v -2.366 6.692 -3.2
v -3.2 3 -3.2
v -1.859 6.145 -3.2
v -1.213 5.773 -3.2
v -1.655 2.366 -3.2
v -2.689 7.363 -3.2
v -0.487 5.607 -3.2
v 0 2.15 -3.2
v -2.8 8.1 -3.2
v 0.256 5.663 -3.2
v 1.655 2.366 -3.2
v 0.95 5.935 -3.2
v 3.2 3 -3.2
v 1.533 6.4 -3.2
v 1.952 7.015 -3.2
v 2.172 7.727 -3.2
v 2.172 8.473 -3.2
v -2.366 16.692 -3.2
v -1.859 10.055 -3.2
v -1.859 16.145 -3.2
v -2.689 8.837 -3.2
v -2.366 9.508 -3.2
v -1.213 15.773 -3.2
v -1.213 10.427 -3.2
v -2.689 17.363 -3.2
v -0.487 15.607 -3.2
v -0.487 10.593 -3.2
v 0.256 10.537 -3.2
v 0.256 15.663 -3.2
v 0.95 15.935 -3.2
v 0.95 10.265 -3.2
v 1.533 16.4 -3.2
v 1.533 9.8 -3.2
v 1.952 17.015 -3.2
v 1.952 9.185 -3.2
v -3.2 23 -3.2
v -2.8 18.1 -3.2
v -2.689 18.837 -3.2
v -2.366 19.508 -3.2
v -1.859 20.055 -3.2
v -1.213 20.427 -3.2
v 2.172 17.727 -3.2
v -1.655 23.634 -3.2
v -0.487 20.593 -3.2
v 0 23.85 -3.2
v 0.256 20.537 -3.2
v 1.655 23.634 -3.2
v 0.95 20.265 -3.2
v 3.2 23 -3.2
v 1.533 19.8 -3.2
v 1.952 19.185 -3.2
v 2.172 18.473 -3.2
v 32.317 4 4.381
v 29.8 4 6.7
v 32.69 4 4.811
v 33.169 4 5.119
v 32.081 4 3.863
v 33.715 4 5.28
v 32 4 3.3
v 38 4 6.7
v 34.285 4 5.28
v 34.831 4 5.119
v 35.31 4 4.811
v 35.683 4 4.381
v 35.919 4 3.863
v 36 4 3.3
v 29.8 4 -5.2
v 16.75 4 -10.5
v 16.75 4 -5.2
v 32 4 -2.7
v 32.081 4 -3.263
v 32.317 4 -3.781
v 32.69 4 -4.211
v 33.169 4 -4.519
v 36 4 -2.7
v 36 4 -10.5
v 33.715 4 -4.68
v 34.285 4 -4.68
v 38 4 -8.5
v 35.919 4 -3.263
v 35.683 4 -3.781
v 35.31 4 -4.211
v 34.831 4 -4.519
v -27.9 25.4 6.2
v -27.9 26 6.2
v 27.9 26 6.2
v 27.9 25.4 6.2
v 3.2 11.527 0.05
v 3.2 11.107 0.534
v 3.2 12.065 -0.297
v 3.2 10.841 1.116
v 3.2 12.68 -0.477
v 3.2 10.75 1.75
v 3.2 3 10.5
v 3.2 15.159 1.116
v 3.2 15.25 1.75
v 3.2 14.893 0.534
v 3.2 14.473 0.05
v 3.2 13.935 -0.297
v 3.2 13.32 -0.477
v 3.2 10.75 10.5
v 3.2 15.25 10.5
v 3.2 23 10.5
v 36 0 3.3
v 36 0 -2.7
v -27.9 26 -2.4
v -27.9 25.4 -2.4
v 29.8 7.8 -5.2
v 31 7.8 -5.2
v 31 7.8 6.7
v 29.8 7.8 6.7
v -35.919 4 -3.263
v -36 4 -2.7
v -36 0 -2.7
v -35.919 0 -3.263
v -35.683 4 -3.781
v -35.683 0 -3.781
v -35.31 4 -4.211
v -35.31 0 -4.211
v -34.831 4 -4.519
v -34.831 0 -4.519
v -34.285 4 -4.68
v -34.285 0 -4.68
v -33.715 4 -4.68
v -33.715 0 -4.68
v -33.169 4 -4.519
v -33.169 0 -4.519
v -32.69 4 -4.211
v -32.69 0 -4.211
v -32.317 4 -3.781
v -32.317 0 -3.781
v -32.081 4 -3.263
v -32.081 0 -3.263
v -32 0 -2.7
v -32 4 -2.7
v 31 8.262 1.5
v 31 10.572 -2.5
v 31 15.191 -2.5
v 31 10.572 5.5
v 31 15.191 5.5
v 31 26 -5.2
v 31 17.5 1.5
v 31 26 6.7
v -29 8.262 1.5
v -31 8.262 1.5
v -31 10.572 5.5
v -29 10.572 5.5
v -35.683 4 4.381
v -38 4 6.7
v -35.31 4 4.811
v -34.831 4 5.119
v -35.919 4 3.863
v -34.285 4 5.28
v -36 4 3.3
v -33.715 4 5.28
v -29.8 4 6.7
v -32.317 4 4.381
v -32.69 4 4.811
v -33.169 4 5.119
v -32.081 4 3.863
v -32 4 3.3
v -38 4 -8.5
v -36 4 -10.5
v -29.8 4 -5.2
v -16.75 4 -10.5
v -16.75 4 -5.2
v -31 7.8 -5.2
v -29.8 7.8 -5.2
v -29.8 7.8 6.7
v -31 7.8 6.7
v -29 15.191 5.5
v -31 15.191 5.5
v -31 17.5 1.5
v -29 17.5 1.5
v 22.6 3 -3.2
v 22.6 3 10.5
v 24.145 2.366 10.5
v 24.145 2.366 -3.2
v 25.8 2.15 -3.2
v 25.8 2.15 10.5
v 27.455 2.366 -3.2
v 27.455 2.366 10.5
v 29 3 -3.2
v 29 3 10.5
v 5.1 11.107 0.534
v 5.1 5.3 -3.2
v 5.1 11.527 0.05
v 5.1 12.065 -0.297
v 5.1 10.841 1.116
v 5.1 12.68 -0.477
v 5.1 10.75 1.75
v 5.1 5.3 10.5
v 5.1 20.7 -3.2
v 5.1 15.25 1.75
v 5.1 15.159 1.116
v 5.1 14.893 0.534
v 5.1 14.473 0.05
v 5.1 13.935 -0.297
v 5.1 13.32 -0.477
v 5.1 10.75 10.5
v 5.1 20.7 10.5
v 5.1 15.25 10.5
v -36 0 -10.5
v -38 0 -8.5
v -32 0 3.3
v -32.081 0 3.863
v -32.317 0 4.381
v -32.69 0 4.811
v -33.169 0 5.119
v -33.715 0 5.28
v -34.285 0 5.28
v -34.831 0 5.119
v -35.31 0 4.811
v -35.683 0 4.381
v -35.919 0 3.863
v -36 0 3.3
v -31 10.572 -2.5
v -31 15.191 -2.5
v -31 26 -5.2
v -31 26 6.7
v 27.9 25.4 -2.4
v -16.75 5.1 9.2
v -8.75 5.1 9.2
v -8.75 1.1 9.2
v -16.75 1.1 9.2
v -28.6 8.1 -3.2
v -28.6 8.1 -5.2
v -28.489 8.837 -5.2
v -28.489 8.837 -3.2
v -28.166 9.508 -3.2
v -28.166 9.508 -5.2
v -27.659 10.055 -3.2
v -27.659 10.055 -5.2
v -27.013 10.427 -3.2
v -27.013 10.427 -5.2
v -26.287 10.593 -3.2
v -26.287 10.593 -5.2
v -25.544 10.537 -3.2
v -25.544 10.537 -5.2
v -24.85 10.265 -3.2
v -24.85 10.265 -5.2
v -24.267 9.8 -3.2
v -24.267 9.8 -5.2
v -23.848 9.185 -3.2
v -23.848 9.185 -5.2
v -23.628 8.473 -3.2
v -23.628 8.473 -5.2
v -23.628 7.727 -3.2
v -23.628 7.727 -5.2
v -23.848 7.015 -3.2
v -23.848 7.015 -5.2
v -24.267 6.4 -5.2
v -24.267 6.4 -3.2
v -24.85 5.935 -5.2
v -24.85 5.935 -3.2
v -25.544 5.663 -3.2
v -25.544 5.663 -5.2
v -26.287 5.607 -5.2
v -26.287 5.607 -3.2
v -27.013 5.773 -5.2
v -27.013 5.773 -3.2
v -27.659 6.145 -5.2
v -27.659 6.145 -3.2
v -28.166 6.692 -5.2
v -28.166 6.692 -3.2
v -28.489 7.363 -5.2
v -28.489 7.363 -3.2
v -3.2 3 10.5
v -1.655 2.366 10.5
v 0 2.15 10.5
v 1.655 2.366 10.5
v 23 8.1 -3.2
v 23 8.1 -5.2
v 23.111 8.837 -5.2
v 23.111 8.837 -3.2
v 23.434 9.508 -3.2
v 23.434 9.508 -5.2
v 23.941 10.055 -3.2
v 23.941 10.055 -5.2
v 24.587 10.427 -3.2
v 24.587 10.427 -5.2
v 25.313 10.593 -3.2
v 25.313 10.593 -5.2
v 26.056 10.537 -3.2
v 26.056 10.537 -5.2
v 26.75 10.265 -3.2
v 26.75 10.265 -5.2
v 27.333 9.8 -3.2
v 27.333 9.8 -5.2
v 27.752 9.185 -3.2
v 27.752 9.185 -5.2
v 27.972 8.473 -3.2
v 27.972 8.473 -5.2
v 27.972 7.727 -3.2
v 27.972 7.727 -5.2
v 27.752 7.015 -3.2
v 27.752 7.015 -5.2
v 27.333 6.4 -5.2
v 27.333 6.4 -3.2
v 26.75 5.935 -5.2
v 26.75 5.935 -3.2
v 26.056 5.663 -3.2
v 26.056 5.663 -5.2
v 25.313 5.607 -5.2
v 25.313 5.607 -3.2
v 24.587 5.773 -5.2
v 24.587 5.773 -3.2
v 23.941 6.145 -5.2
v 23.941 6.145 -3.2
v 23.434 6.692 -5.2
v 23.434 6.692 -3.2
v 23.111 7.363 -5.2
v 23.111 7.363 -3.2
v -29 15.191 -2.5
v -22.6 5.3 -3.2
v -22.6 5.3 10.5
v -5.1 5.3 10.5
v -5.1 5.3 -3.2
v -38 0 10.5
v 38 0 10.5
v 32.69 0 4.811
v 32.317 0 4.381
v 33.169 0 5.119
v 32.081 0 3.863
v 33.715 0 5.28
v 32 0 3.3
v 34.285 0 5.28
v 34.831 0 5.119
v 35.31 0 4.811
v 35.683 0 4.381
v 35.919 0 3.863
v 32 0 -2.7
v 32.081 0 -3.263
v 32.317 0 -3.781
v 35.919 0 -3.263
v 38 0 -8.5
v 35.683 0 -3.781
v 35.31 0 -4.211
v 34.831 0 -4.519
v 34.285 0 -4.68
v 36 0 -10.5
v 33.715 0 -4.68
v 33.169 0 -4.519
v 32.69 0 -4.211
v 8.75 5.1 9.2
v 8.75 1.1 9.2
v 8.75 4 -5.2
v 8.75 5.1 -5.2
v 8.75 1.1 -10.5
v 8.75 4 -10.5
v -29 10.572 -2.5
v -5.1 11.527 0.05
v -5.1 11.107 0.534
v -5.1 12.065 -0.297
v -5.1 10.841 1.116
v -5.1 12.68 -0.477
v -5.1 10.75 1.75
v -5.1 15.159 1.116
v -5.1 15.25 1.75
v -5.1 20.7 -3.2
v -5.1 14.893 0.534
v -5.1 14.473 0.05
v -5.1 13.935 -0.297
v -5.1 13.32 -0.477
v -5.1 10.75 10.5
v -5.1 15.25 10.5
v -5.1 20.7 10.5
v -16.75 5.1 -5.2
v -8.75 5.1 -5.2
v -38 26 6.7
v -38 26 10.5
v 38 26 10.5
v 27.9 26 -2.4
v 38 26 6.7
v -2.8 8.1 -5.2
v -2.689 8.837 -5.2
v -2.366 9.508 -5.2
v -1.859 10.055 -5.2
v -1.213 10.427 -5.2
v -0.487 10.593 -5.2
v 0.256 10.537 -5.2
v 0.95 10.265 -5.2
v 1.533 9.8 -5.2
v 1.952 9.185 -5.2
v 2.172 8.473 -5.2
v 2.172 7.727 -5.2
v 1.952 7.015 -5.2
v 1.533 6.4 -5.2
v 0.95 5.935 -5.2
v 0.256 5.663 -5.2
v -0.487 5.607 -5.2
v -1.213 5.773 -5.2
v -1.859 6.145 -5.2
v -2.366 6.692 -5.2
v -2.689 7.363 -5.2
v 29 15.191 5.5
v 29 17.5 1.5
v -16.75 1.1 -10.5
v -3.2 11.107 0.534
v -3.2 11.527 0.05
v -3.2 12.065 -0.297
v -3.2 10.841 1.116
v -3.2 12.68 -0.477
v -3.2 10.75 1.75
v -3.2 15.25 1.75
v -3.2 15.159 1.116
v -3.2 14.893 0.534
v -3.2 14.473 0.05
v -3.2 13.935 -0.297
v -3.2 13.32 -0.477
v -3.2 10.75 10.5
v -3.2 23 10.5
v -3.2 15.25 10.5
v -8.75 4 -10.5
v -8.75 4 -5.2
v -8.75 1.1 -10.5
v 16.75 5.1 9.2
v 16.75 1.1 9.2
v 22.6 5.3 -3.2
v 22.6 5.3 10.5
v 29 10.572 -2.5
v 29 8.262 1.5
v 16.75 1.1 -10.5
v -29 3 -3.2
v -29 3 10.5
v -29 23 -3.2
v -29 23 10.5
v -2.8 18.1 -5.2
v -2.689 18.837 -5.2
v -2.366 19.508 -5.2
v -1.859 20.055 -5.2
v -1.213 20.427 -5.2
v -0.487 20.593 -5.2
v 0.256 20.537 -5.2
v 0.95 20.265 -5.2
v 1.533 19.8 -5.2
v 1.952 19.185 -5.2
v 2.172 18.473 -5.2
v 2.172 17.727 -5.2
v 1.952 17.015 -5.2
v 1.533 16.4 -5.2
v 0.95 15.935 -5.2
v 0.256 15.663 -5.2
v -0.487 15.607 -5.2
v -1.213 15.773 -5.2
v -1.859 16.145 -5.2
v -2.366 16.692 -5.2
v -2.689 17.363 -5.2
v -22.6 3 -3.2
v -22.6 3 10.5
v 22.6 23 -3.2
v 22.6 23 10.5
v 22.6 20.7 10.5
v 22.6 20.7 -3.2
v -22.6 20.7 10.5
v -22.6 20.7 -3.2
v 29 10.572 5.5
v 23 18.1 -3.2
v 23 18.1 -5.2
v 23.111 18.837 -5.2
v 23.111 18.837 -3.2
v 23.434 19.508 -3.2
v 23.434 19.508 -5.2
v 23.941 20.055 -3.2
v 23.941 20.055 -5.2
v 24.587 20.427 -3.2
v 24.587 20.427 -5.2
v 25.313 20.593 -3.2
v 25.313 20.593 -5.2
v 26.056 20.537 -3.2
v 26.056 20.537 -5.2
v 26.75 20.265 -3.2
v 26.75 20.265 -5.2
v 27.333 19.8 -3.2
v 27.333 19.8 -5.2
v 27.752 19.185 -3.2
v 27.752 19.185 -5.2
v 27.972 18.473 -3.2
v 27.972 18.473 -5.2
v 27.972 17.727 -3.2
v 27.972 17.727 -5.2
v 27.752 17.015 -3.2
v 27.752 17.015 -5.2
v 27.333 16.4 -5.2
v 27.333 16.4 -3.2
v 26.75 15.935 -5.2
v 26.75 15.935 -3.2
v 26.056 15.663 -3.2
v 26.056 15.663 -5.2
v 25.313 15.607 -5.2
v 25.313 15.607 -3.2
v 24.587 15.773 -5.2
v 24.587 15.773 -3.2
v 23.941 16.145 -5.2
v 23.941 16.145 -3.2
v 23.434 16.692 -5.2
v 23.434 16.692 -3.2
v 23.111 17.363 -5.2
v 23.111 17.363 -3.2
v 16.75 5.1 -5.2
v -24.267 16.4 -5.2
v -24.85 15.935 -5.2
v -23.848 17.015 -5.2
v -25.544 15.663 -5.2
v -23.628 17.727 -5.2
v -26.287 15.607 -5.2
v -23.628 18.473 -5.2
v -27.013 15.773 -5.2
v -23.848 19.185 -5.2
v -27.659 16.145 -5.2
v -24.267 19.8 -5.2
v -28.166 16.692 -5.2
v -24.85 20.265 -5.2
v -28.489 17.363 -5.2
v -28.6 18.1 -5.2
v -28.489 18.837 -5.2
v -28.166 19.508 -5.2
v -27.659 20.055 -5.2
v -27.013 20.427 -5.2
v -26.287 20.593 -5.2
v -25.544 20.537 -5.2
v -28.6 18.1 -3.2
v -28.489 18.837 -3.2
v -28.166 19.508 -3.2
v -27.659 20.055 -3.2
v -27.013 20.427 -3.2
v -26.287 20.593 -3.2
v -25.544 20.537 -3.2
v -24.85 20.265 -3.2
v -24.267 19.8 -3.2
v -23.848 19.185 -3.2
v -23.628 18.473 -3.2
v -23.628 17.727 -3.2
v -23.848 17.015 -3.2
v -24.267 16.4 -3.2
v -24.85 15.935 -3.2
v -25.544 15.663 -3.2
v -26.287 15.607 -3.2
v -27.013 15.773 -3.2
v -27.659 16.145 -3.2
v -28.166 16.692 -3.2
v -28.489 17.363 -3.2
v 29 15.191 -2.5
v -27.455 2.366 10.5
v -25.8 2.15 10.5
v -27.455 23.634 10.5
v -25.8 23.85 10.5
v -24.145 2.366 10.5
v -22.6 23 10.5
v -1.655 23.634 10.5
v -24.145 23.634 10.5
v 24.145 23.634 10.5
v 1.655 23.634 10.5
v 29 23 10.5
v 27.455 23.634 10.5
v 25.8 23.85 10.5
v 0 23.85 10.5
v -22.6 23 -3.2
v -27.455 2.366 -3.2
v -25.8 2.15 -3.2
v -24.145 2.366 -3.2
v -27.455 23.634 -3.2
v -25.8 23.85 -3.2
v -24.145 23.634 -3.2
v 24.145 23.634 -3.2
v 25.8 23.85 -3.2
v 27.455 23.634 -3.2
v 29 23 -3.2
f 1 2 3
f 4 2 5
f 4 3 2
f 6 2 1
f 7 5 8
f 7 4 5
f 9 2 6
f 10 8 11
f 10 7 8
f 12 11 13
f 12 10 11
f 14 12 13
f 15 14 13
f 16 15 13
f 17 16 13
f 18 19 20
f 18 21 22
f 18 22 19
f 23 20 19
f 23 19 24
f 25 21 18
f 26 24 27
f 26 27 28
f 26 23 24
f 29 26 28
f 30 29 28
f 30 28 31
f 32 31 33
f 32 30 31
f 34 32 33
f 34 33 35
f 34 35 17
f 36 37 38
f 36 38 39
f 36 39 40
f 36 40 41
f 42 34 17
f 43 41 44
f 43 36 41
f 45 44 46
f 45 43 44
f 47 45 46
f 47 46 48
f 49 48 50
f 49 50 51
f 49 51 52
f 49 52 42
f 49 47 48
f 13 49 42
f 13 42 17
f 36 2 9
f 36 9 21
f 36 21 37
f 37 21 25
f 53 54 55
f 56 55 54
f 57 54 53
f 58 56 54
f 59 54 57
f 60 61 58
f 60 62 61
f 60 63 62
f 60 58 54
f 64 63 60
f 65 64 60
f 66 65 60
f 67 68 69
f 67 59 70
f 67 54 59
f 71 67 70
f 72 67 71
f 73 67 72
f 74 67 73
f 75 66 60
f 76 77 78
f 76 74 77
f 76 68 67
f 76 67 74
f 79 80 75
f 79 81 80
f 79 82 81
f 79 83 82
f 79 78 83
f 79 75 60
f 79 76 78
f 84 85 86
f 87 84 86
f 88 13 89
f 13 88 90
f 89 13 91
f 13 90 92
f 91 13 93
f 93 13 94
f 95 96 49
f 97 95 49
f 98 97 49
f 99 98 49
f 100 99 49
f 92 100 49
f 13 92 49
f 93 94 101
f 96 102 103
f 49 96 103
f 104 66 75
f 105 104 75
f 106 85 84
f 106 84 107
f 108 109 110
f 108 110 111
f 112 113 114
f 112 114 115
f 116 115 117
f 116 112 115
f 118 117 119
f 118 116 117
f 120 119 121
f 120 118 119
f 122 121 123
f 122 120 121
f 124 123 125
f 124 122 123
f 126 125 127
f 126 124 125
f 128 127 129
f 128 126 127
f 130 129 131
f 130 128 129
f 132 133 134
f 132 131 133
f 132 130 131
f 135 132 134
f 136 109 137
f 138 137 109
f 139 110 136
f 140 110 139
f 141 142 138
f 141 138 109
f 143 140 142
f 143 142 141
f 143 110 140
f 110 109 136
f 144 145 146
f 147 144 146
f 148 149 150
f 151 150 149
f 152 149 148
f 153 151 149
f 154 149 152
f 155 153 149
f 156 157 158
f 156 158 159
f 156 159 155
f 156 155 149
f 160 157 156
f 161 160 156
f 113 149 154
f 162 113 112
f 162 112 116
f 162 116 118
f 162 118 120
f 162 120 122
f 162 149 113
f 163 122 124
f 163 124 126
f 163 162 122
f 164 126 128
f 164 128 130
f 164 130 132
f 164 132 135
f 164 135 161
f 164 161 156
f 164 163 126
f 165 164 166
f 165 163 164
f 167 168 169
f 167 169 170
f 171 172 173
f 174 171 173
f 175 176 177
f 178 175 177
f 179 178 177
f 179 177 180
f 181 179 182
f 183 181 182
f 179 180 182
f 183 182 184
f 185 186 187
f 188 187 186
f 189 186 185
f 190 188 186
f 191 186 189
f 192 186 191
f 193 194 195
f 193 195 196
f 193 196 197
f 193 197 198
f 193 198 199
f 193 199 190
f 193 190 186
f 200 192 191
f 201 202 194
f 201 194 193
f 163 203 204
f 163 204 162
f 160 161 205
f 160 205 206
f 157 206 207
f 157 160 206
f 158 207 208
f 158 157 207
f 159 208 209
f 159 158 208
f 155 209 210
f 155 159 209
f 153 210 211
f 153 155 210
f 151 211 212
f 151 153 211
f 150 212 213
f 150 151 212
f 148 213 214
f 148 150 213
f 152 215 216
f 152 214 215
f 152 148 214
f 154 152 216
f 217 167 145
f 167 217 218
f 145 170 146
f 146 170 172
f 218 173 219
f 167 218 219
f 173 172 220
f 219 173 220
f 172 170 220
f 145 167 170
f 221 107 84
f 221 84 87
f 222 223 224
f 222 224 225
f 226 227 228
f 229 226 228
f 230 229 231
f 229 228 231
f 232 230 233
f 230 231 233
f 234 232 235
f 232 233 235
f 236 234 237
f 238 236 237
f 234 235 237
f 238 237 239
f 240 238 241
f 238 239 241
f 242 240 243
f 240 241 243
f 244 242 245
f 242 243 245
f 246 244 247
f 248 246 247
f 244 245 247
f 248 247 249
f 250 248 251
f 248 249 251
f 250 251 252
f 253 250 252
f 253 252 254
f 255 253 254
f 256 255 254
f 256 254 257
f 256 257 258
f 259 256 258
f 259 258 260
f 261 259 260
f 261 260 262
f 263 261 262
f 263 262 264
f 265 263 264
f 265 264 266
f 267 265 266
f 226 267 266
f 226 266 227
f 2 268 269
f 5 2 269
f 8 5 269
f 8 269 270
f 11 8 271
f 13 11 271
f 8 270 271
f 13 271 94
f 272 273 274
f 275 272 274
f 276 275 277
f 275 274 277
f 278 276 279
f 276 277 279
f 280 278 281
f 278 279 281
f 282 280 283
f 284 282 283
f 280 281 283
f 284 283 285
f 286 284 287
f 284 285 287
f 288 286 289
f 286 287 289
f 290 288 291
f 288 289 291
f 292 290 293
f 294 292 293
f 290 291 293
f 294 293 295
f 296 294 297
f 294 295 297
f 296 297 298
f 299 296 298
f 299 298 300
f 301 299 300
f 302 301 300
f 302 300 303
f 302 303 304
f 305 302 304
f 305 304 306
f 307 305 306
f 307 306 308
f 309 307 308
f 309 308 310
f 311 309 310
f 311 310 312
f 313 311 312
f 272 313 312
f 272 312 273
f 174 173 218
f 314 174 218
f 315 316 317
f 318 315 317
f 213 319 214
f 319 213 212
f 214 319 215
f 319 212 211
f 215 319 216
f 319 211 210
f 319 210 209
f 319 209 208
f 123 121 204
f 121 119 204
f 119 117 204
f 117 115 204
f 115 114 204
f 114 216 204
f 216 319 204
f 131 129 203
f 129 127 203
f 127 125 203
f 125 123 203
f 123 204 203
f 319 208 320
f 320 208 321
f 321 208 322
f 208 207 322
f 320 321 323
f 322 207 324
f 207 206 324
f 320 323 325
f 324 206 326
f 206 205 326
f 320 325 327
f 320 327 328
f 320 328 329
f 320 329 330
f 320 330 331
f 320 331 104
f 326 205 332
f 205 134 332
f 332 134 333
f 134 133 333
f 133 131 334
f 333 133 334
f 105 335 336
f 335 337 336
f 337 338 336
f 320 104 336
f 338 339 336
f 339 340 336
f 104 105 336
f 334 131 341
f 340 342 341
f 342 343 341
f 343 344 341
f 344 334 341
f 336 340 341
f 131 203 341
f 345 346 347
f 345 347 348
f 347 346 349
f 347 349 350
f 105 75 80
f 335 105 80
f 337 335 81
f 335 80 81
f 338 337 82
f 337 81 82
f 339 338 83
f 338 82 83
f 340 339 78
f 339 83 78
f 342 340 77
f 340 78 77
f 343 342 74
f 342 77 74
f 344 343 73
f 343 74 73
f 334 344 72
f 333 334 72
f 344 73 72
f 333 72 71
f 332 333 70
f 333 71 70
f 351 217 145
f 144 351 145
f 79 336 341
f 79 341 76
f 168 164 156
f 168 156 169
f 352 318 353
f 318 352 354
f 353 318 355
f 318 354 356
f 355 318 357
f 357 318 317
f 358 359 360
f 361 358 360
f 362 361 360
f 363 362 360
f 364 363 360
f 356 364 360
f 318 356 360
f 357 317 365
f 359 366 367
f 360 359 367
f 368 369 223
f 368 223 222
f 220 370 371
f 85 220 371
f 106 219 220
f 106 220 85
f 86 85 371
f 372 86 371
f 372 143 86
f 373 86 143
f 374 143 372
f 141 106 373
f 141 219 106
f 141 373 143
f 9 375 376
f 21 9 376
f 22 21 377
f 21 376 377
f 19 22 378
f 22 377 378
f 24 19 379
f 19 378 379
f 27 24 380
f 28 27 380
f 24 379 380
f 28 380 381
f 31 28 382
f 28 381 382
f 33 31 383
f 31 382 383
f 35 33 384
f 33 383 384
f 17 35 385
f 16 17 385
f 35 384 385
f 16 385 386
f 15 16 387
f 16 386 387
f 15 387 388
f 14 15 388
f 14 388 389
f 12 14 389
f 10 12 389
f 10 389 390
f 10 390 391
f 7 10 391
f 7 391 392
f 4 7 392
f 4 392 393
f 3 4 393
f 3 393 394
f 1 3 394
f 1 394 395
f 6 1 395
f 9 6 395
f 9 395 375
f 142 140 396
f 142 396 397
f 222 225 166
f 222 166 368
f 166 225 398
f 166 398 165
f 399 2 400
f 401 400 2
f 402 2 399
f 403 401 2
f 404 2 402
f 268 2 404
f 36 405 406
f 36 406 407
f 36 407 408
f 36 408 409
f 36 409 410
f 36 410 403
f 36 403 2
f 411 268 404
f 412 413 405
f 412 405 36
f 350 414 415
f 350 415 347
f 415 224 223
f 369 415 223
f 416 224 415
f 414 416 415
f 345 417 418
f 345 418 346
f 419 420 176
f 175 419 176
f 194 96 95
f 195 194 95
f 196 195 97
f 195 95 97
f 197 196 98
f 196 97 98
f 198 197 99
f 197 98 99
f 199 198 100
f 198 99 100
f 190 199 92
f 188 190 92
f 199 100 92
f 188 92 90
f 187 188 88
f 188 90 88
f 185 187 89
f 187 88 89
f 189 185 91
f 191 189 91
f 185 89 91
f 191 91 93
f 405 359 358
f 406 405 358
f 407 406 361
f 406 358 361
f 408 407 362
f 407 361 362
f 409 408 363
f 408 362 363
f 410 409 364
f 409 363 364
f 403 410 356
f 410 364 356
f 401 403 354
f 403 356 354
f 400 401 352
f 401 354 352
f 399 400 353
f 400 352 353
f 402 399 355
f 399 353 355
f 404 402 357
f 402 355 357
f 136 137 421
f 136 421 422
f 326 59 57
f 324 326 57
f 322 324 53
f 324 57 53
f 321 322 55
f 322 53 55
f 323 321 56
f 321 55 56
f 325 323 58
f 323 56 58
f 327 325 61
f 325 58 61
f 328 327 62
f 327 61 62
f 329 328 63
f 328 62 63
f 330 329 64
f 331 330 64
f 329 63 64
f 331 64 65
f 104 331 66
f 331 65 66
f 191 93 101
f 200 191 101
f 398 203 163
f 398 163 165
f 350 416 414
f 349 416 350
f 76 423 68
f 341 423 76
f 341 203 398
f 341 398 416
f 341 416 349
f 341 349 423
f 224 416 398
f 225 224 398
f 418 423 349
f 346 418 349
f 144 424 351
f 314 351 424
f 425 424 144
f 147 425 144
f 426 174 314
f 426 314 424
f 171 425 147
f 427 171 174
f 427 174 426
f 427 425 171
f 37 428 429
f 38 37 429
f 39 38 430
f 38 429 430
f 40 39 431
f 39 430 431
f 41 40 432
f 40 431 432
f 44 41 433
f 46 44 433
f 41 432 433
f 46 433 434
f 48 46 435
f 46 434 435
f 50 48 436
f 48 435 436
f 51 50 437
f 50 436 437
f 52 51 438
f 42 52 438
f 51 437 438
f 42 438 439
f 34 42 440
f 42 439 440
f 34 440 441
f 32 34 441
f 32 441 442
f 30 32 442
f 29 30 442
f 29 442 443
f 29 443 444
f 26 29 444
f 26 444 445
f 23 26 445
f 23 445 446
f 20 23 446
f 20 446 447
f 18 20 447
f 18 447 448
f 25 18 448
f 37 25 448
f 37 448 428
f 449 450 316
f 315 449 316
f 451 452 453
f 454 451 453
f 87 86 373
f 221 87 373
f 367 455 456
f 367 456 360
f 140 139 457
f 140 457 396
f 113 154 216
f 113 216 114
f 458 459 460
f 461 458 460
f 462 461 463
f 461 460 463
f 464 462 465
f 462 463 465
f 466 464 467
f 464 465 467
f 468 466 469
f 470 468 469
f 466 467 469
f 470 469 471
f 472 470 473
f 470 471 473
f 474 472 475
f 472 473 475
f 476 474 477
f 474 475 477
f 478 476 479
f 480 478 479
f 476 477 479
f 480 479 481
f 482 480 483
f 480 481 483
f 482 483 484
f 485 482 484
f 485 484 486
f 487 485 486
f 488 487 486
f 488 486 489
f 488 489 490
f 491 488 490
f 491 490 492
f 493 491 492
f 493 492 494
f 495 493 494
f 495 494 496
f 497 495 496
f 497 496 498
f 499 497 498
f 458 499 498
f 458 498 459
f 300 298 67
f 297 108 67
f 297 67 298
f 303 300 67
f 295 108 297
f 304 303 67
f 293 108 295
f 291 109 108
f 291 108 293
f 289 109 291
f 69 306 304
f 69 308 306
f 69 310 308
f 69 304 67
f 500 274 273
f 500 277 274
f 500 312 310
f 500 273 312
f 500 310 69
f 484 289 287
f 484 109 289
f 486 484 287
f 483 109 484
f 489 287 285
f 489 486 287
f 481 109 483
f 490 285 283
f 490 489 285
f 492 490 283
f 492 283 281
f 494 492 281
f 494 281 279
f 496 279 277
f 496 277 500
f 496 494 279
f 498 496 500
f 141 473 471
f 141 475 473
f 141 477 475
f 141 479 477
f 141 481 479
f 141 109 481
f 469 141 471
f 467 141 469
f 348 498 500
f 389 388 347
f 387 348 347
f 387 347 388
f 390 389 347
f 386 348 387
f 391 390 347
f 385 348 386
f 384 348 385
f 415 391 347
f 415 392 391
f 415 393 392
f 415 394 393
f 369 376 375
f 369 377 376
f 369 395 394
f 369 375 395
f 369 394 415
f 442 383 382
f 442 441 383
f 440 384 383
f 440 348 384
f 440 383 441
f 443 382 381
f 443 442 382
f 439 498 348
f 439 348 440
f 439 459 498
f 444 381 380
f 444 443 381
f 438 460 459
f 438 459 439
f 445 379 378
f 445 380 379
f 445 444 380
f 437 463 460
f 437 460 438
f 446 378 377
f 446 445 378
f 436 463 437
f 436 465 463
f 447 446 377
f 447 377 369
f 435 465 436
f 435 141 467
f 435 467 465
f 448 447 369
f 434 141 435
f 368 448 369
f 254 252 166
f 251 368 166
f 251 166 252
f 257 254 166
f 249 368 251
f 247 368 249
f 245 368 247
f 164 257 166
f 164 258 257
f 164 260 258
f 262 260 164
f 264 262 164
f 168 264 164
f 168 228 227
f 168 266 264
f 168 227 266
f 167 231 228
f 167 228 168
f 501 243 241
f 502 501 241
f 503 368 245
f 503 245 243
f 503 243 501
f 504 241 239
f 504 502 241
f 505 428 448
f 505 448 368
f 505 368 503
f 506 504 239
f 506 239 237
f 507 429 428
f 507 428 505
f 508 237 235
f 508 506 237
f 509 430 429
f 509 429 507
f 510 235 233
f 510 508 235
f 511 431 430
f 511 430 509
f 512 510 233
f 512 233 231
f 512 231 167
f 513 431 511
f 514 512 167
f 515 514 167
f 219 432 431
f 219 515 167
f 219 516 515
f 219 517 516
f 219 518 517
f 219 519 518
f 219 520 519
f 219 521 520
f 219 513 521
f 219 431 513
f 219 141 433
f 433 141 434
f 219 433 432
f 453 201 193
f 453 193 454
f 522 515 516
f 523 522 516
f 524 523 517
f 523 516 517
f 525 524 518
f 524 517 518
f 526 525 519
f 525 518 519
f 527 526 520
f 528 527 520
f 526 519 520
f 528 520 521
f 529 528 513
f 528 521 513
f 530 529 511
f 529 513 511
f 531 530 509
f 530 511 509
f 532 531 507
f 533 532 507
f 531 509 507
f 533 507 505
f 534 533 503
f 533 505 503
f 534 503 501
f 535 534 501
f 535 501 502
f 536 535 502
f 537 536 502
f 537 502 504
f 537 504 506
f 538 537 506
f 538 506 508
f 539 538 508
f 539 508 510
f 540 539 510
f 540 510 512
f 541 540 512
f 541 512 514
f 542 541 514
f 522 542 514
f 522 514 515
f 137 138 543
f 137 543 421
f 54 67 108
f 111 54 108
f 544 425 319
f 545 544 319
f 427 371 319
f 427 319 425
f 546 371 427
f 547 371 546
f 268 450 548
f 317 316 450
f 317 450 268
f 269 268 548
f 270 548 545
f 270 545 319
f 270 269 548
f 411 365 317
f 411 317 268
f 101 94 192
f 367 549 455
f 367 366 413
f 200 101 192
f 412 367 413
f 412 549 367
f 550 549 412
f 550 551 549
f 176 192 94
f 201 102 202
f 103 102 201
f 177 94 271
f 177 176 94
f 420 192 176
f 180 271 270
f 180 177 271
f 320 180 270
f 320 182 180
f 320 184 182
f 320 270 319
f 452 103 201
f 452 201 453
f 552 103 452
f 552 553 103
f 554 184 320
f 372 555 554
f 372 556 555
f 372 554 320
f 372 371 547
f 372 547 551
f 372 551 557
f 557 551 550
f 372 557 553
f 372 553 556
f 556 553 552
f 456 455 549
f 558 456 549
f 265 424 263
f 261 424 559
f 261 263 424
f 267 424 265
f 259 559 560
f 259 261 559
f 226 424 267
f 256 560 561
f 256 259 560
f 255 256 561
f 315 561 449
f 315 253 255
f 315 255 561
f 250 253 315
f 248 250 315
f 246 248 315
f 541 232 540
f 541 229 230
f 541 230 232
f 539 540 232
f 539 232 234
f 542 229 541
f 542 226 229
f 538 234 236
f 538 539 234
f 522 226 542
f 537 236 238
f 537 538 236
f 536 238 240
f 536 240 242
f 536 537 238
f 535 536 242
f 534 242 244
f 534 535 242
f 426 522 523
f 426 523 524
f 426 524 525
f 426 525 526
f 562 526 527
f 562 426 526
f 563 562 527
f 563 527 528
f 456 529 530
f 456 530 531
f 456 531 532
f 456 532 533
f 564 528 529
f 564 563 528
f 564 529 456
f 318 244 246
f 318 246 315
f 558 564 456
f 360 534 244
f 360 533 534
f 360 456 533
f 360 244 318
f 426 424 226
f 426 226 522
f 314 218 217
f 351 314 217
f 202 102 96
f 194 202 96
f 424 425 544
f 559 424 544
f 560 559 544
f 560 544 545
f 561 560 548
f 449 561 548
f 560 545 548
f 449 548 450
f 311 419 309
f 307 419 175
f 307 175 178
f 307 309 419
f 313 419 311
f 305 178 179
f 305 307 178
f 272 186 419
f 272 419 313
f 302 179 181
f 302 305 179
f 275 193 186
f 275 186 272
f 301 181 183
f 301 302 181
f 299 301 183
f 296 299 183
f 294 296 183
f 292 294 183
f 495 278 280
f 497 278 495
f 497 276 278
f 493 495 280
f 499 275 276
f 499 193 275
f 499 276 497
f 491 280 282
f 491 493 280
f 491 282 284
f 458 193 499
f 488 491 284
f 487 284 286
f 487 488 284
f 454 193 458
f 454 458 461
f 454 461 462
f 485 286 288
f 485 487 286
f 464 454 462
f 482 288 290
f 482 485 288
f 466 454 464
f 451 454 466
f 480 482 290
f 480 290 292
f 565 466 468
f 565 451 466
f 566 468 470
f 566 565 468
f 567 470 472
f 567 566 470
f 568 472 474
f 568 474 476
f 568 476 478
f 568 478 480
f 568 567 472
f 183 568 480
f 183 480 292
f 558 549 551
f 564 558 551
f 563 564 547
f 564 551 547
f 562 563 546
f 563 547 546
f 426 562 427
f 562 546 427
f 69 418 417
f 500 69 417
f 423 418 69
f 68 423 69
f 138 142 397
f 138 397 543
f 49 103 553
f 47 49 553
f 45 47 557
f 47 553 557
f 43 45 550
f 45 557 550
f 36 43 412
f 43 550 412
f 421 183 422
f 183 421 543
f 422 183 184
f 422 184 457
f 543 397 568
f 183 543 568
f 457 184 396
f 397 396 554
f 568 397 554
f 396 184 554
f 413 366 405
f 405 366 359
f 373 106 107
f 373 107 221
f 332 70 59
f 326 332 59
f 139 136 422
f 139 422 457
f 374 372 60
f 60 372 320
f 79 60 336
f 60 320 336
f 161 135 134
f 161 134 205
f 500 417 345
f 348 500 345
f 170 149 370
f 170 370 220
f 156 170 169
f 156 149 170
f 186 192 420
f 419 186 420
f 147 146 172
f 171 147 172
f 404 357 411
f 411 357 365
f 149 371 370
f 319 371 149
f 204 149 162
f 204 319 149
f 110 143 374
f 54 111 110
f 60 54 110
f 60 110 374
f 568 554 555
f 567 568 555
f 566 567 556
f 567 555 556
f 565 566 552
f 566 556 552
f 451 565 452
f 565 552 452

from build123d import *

# Parameters (mm, degrees)
SKETCH1_W           = 76
SKETCH1_H           = 21
BOSS_EXTRUDE1_DEPTH = 4
SKETCH2_W           = 76
SKETCH2_H           = 3.8
BOSS_EXTRUDE2_DEPTH = 26
SKETCH3_W           = 62
SKETCH3_H           = 22
BOSS_EXTRUDE3_DEPTH = 15.7
CHAMFER2_SIZE       = 2
SKETCH4_W           = 55.8
SKETCH4_H           = 8.6
CUT_EXTRUDE1_DEPTH  = 0.6
CUT_EXTRUDE2_DEPTH  = 46.14698218
SKETCH6_W           = 8
SKETCH6_H           = 4
CUT_EXTRUDE3_DEPTH  = 19.7
SKETCH7_W           = 58
SKETCH7_H           = 15.4
CUT_EXTRUDE4_DEPTH  = 13.7
CUT_EXTRUDE5_DEPTH  = 13.7
LPATTERN1_COUNT     = 3
LPATTERN1_PITCH     = 25.8
BOSS_EXTRUDE4_REACH = 52.606
SKETCH9_W           = 1.9
SKETCH9_H           = 15.4
CUT_EXTRUDE6_REACH  = 53.418
CUT_EXTRUDE7_REACH  = 76.48
SKETCH12_W          = 1.2
SKETCH12_H          = 3.8
CUT_EXTRUDE8_DEPTH  = 11.9
CUT_EXTRUDE9_REACH  = 50.647
SKETCH13_R          = 2.5


with BuildPart() as part:
    # Sketch1 → Boss-Extrude1 (new body)
    with BuildSketch(Plane(origin=(0, 0, 0), x_dir=(1, 0, 0), z_dir=(0, 1, 0))):
        Rectangle(SKETCH1_W, SKETCH1_H)
    extrude(amount=BOSS_EXTRUDE1_DEPTH)

    # Sketch2 → Boss-Extrude2 (add)
    with BuildSketch(Plane(origin=(0, 0, 0), x_dir=(1, 0, 0), z_dir=(0, 1, 0))):
        with Locations((0, -8.6)):
            Rectangle(SKETCH2_W, SKETCH2_H)
    extrude(amount=BOSS_EXTRUDE2_DEPTH)

    # Sketch3 → Boss-Extrude3 (add)
    with BuildSketch(Plane(origin=(0, 0, 10.5), x_dir=(-1, 0, 0), z_dir=(0, 0, -1))):
        with Locations((0, 15)):
            Rectangle(SKETCH3_W, SKETCH3_H)
    extrude(amount=BOSS_EXTRUDE3_DEPTH)

    # Chamfer2
    chamfer2_edges = [part.edges().sort_by_distance(p)[0] for p in [
        (-38, 2, -10.5),
        (38, 2, -10.5),
    ]]
    chamfer(chamfer2_edges, length=CHAMFER2_SIZE)

    # Sketch4 → Cut-Extrude1 (cut)
    with BuildSketch(Plane(origin=(0, 26, 0), x_dir=(1, 0, 0), z_dir=(0, 1, 0))):
        with Locations((0, -1.9)):
            Rectangle(SKETCH4_W, SKETCH4_H)
    extrude(amount=-CUT_EXTRUDE1_DEPTH, mode=Mode.SUBTRACT)

    # Sketch5 → Cut-Extrude2 (cut, through all)
    with BuildSketch(Plane(origin=(0, 4, 0), x_dir=(1, 0, 0), z_dir=(0, 1, 0))):
        with BuildLine():
            Line((-32, 2.7), (-32, -3.3))
            ThreePointArc((-32, -3.3), (-34, -5.3), (-36, -3.3))
            Line((-36, -3.3), (-36, 2.7))
            ThreePointArc((-36, 2.7), (-34, 4.7), (-32, 2.7))
        make_face()
        with BuildLine():
            Line((32, 2.7), (32, -3.3))
            ThreePointArc((32, -3.3), (34, -5.3), (36, -3.3))
            Line((36, -3.3), (36, 2.7))
            ThreePointArc((36, 2.7), (34, 4.7), (32, 2.7))
        make_face()
    extrude(amount=-CUT_EXTRUDE2_DEPTH, mode=Mode.SUBTRACT)

    # Sketch6 → Cut-Extrude3 (cut)
    with BuildSketch(Plane(origin=(0, 0, -10.5), x_dir=(-1, 0, 0), z_dir=(0, 0, -1))):
        with Locations((-12.75, 3.1)):
            Rectangle(SKETCH6_W, SKETCH6_H)
        with Locations((12.75, 3.1)):
            Rectangle(SKETCH6_W, SKETCH6_H)
    extrude(amount=-CUT_EXTRUDE3_DEPTH, mode=Mode.SUBTRACT)

    # Sketch7 → Cut-Extrude4 (cut)
    with BuildSketch(Plane.XY.offset(10.5)):
        with Locations((0, 13)):
            Rectangle(SKETCH7_W, SKETCH7_H)
    extrude(amount=-CUT_EXTRUDE4_DEPTH, mode=Mode.SUBTRACT)

    # Sketch8 → Cut-Extrude5 (cut)
    with BuildSketch(Plane.XY.offset(10.5)):
        with BuildLine():
            Line((-29, 23), (-29, 3))
            ThreePointArc((-29, 3), (-25.8, 2.15), (-22.6, 3))
            Line((-22.6, 3), (-22.6, 23))
            ThreePointArc((-22.6, 23), (-25.8, 23.85), (-29, 23))
        make_face()
    cut_extrude5 = extrude(amount=-CUT_EXTRUDE5_DEPTH, mode=Mode.SUBTRACT)

    # LPattern1: Cut-Extrude5 ×3
    with Locations(*[(i * LPATTERN1_PITCH, 0, 0) for i in range(1, LPATTERN1_COUNT)]):
        add(cut_extrude5, mode=Mode.SUBTRACT)

    # Sketch9 → Boss-Extrude4 (add, up to next)
    with BuildSketch(Plane.XY.offset(10.5), mode=Mode.PRIVATE) as boss_extrude4_sk1:
        with Locations((-4.15, 13)):
            Rectangle(SKETCH9_W, SKETCH9_H)
    boss_extrude4_tool1 = extrude(boss_extrude4_sk1.sketch, amount=-BOSS_EXTRUDE4_REACH, mode=Mode.PRIVATE) - part.part
    # Sketch9 → Boss-Extrude4 (add, up to next)
    with BuildSketch(Plane.XY.offset(10.5), mode=Mode.PRIVATE) as boss_extrude4_sk2:
        with Locations((4.15, 13)):
            Rectangle(SKETCH9_W, SKETCH9_H)
    boss_extrude4_tool2 = extrude(boss_extrude4_sk2.sketch, amount=-BOSS_EXTRUDE4_REACH, mode=Mode.PRIVATE) - part.part
    add(boss_extrude4_tool1.solids().sort_by_distance((-4.15, 13, 10.5))[0])
    add(boss_extrude4_tool2.solids().sort_by_distance((4.15, 13, 10.5))[0])

    # Cut-Extrude6: up to this face of the body (flat: up to its plane)
    cut_extrude6_end = Plane(part.part.faces().sort_by_distance((5.1, 13, 3.65))[0])
    # Sketch10 → Cut-Extrude6 (cut, up to the picked face)
    with BuildSketch(Plane.ZY.offset(5.1), mode=Mode.PRIVATE) as cut_extrude6_sk1:
        with BuildLine():
            Line((10.5, 15.25), (1.75, 15.25))
            ThreePointArc((1.75, 15.25), (-0.5, 13), (1.75, 10.75))
            Line((1.75, 10.75), (10.5, 10.75))
            Line((10.5, 10.75), (10.5, 15.25))
        make_face()
    cut_extrude6_tool1 = split(extrude(cut_extrude6_sk1.sketch, amount=-CUT_EXTRUDE6_REACH, mode=Mode.PRIVATE), bisect_by=cut_extrude6_end, keep=Keep.BOTH, mode=Mode.PRIVATE)
    add(cut_extrude6_tool1.solids().sort_by(Axis((-5.1, 13, 5.229437), (1, 0, 0)))[0], mode=Mode.SUBTRACT)

    # Sketch11 → Cut-Extrude7 (cut, up to next)
    with BuildSketch(Plane.ZY.offset(31), mode=Mode.PRIVATE) as cut_extrude7_sk1:
        Polygon((1.5, 17.5), (-2.5, 15.190598923), (-2.5, 10.57179677), (1.5, 8.262395693), (5.5, 10.57179677), (5.5, 15.190598923), align=None)
    cut_extrude7_tool1 = extrude(cut_extrude7_sk1.sketch, amount=-CUT_EXTRUDE7_REACH, mode=Mode.PRIVATE) & part.part
    cut_extrude7 = cut_extrude7_tool1.solids().sort_by_distance((-31, 12.881198, 1.5))[0]
    add(cut_extrude7, mode=Mode.SUBTRACT)

    # Mirror1: Cut-Extrude7 across plane
    add(cut_extrude7.mirror(Plane(origin=(0, 0, 0), x_dir=(0, 0, 1), z_dir=(1, 0, 0))), mode=Mode.SUBTRACT)

    # Sketch12 → Cut-Extrude8 (cut)
    with BuildSketch(Plane(origin=(0, 0, -5.2), x_dir=(-1, 0, 0), z_dir=(0, 0, -1))):
        with Locations((-30.4, 5.9)):
            Rectangle(SKETCH12_W, SKETCH12_H)
        with Locations((30.4, 5.9)):
            Rectangle(SKETCH12_W, SKETCH12_H)
    extrude(amount=-CUT_EXTRUDE8_DEPTH, mode=Mode.SUBTRACT)

    # Sketch13 → Cut-Extrude9 (cut, up to next)
    with BuildSketch(Plane(origin=(0, 0, -5.2), x_dir=(-1, 0, 0), z_dir=(0, 0, -1)), mode=Mode.PRIVATE) as cut_extrude9_sk1:
        with Locations((-25.5, 18.1)):
            Circle(SKETCH13_R)
    cut_extrude9_tool1 = extrude(cut_extrude9_sk1.sketch, amount=-CUT_EXTRUDE9_REACH, mode=Mode.PRIVATE) & part.part
    # Sketch13 → Cut-Extrude9 (cut, up to next)
    with BuildSketch(Plane(origin=(0, 0, -5.2), x_dir=(-1, 0, 0), z_dir=(0, 0, -1)), mode=Mode.PRIVATE) as cut_extrude9_sk2:
        with Locations((0.3, 18.1)):
            Circle(SKETCH13_R)
    cut_extrude9_tool2 = extrude(cut_extrude9_sk2.sketch, amount=-CUT_EXTRUDE9_REACH, mode=Mode.PRIVATE) & part.part
    # Sketch13 → Cut-Extrude9 (cut, up to next)
    with BuildSketch(Plane(origin=(0, 0, -5.2), x_dir=(-1, 0, 0), z_dir=(0, 0, -1)), mode=Mode.PRIVATE) as cut_extrude9_sk3:
        with Locations((26.1, 18.1)):
            Circle(SKETCH13_R)
    cut_extrude9_tool3 = extrude(cut_extrude9_sk3.sketch, amount=-CUT_EXTRUDE9_REACH, mode=Mode.PRIVATE) & part.part
    # Sketch13 → Cut-Extrude9 (cut, up to next)
    with BuildSketch(Plane(origin=(0, 0, -5.2), x_dir=(-1, 0, 0), z_dir=(0, 0, -1)), mode=Mode.PRIVATE) as cut_extrude9_sk4:
        with Locations((0.3, 8.1)):
            Circle(SKETCH13_R)
    cut_extrude9_tool4 = extrude(cut_extrude9_sk4.sketch, amount=-CUT_EXTRUDE9_REACH, mode=Mode.PRIVATE) & part.part
    # Sketch13 → Cut-Extrude9 (cut, up to next)
    with BuildSketch(Plane(origin=(0, 0, -5.2), x_dir=(-1, 0, 0), z_dir=(0, 0, -1)), mode=Mode.PRIVATE) as cut_extrude9_sk5:
        with Locations((26.1, 8.1)):
            Circle(SKETCH13_R)
    cut_extrude9_tool5 = extrude(cut_extrude9_sk5.sketch, amount=-CUT_EXTRUDE9_REACH, mode=Mode.PRIVATE) & part.part
    # Sketch13 → Cut-Extrude9 (cut, up to next)
    with BuildSketch(Plane(origin=(0, 0, -5.2), x_dir=(-1, 0, 0), z_dir=(0, 0, -1)), mode=Mode.PRIVATE) as cut_extrude9_sk6:
        with Locations((-25.5, 8.1)):
            Circle(SKETCH13_R)
    cut_extrude9_tool6 = extrude(cut_extrude9_sk6.sketch, amount=-CUT_EXTRUDE9_REACH, mode=Mode.PRIVATE) & part.part
    add(cut_extrude9_tool1.solids().sort_by_distance((25.5, 18.1, -5.2))[0], mode=Mode.SUBTRACT)
    add(cut_extrude9_tool2.solids().sort_by_distance((-0.3, 18.1, -5.2))[0], mode=Mode.SUBTRACT)
    add(cut_extrude9_tool3.solids().sort_by_distance((-26.1, 18.1, -5.2))[0], mode=Mode.SUBTRACT)
    add(cut_extrude9_tool4.solids().sort_by_distance((-0.3, 8.1, -5.2))[0], mode=Mode.SUBTRACT)
    add(cut_extrude9_tool5.solids().sort_by_distance((-26.1, 8.1, -5.2))[0], mode=Mode.SUBTRACT)
    add(cut_extrude9_tool6.solids().sort_by_distance((25.5, 8.1, -5.2))[0], mode=Mode.SUBTRACT)


solid = part.part
